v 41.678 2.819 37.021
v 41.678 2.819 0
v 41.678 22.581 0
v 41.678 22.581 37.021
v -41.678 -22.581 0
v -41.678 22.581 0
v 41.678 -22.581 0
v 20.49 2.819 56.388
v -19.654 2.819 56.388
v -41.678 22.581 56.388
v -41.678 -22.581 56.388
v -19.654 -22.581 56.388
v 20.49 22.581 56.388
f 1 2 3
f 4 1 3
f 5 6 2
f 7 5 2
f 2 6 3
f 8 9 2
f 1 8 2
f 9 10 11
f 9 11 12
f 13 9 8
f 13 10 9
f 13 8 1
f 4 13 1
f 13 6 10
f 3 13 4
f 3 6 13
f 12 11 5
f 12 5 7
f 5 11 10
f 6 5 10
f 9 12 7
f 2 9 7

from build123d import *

# Parameters (mm, degrees)
F0_W     = 83.355368
F0_H     = 45.16244
F1_DEPTH = 56.388
F3_DEPTH = 25.4
F5_DEPTH = 25.4


with BuildPart() as f1:
    # F0 (on Top) → F1 (new body)
    with BuildSketch(Plane.XY):
        Rectangle(F0_W, F0_H)
    extrude(amount=F1_DEPTH)

    # F2 (on face) → F3 (cut)
    with BuildSketch(Plane.XZ.offset(22.58122)):
        Polygon((41.677684, 56.388), (-19.654024, 56.388), (41.677684, 0), align=None)
    extrude(amount=-F3_DEPTH, mode=Mode.SUBTRACT)

    # F4 (on face) → F5 (cut)
    with BuildSketch(Plane.XZ.offset(-2.81878)):
        Polygon((41.677684, 56.388), (20.490363, 56.388), (41.677684, 37.021209), align=None)
    extrude(amount=-F5_DEPTH, mode=Mode.SUBTRACT)


solid = f1.part
